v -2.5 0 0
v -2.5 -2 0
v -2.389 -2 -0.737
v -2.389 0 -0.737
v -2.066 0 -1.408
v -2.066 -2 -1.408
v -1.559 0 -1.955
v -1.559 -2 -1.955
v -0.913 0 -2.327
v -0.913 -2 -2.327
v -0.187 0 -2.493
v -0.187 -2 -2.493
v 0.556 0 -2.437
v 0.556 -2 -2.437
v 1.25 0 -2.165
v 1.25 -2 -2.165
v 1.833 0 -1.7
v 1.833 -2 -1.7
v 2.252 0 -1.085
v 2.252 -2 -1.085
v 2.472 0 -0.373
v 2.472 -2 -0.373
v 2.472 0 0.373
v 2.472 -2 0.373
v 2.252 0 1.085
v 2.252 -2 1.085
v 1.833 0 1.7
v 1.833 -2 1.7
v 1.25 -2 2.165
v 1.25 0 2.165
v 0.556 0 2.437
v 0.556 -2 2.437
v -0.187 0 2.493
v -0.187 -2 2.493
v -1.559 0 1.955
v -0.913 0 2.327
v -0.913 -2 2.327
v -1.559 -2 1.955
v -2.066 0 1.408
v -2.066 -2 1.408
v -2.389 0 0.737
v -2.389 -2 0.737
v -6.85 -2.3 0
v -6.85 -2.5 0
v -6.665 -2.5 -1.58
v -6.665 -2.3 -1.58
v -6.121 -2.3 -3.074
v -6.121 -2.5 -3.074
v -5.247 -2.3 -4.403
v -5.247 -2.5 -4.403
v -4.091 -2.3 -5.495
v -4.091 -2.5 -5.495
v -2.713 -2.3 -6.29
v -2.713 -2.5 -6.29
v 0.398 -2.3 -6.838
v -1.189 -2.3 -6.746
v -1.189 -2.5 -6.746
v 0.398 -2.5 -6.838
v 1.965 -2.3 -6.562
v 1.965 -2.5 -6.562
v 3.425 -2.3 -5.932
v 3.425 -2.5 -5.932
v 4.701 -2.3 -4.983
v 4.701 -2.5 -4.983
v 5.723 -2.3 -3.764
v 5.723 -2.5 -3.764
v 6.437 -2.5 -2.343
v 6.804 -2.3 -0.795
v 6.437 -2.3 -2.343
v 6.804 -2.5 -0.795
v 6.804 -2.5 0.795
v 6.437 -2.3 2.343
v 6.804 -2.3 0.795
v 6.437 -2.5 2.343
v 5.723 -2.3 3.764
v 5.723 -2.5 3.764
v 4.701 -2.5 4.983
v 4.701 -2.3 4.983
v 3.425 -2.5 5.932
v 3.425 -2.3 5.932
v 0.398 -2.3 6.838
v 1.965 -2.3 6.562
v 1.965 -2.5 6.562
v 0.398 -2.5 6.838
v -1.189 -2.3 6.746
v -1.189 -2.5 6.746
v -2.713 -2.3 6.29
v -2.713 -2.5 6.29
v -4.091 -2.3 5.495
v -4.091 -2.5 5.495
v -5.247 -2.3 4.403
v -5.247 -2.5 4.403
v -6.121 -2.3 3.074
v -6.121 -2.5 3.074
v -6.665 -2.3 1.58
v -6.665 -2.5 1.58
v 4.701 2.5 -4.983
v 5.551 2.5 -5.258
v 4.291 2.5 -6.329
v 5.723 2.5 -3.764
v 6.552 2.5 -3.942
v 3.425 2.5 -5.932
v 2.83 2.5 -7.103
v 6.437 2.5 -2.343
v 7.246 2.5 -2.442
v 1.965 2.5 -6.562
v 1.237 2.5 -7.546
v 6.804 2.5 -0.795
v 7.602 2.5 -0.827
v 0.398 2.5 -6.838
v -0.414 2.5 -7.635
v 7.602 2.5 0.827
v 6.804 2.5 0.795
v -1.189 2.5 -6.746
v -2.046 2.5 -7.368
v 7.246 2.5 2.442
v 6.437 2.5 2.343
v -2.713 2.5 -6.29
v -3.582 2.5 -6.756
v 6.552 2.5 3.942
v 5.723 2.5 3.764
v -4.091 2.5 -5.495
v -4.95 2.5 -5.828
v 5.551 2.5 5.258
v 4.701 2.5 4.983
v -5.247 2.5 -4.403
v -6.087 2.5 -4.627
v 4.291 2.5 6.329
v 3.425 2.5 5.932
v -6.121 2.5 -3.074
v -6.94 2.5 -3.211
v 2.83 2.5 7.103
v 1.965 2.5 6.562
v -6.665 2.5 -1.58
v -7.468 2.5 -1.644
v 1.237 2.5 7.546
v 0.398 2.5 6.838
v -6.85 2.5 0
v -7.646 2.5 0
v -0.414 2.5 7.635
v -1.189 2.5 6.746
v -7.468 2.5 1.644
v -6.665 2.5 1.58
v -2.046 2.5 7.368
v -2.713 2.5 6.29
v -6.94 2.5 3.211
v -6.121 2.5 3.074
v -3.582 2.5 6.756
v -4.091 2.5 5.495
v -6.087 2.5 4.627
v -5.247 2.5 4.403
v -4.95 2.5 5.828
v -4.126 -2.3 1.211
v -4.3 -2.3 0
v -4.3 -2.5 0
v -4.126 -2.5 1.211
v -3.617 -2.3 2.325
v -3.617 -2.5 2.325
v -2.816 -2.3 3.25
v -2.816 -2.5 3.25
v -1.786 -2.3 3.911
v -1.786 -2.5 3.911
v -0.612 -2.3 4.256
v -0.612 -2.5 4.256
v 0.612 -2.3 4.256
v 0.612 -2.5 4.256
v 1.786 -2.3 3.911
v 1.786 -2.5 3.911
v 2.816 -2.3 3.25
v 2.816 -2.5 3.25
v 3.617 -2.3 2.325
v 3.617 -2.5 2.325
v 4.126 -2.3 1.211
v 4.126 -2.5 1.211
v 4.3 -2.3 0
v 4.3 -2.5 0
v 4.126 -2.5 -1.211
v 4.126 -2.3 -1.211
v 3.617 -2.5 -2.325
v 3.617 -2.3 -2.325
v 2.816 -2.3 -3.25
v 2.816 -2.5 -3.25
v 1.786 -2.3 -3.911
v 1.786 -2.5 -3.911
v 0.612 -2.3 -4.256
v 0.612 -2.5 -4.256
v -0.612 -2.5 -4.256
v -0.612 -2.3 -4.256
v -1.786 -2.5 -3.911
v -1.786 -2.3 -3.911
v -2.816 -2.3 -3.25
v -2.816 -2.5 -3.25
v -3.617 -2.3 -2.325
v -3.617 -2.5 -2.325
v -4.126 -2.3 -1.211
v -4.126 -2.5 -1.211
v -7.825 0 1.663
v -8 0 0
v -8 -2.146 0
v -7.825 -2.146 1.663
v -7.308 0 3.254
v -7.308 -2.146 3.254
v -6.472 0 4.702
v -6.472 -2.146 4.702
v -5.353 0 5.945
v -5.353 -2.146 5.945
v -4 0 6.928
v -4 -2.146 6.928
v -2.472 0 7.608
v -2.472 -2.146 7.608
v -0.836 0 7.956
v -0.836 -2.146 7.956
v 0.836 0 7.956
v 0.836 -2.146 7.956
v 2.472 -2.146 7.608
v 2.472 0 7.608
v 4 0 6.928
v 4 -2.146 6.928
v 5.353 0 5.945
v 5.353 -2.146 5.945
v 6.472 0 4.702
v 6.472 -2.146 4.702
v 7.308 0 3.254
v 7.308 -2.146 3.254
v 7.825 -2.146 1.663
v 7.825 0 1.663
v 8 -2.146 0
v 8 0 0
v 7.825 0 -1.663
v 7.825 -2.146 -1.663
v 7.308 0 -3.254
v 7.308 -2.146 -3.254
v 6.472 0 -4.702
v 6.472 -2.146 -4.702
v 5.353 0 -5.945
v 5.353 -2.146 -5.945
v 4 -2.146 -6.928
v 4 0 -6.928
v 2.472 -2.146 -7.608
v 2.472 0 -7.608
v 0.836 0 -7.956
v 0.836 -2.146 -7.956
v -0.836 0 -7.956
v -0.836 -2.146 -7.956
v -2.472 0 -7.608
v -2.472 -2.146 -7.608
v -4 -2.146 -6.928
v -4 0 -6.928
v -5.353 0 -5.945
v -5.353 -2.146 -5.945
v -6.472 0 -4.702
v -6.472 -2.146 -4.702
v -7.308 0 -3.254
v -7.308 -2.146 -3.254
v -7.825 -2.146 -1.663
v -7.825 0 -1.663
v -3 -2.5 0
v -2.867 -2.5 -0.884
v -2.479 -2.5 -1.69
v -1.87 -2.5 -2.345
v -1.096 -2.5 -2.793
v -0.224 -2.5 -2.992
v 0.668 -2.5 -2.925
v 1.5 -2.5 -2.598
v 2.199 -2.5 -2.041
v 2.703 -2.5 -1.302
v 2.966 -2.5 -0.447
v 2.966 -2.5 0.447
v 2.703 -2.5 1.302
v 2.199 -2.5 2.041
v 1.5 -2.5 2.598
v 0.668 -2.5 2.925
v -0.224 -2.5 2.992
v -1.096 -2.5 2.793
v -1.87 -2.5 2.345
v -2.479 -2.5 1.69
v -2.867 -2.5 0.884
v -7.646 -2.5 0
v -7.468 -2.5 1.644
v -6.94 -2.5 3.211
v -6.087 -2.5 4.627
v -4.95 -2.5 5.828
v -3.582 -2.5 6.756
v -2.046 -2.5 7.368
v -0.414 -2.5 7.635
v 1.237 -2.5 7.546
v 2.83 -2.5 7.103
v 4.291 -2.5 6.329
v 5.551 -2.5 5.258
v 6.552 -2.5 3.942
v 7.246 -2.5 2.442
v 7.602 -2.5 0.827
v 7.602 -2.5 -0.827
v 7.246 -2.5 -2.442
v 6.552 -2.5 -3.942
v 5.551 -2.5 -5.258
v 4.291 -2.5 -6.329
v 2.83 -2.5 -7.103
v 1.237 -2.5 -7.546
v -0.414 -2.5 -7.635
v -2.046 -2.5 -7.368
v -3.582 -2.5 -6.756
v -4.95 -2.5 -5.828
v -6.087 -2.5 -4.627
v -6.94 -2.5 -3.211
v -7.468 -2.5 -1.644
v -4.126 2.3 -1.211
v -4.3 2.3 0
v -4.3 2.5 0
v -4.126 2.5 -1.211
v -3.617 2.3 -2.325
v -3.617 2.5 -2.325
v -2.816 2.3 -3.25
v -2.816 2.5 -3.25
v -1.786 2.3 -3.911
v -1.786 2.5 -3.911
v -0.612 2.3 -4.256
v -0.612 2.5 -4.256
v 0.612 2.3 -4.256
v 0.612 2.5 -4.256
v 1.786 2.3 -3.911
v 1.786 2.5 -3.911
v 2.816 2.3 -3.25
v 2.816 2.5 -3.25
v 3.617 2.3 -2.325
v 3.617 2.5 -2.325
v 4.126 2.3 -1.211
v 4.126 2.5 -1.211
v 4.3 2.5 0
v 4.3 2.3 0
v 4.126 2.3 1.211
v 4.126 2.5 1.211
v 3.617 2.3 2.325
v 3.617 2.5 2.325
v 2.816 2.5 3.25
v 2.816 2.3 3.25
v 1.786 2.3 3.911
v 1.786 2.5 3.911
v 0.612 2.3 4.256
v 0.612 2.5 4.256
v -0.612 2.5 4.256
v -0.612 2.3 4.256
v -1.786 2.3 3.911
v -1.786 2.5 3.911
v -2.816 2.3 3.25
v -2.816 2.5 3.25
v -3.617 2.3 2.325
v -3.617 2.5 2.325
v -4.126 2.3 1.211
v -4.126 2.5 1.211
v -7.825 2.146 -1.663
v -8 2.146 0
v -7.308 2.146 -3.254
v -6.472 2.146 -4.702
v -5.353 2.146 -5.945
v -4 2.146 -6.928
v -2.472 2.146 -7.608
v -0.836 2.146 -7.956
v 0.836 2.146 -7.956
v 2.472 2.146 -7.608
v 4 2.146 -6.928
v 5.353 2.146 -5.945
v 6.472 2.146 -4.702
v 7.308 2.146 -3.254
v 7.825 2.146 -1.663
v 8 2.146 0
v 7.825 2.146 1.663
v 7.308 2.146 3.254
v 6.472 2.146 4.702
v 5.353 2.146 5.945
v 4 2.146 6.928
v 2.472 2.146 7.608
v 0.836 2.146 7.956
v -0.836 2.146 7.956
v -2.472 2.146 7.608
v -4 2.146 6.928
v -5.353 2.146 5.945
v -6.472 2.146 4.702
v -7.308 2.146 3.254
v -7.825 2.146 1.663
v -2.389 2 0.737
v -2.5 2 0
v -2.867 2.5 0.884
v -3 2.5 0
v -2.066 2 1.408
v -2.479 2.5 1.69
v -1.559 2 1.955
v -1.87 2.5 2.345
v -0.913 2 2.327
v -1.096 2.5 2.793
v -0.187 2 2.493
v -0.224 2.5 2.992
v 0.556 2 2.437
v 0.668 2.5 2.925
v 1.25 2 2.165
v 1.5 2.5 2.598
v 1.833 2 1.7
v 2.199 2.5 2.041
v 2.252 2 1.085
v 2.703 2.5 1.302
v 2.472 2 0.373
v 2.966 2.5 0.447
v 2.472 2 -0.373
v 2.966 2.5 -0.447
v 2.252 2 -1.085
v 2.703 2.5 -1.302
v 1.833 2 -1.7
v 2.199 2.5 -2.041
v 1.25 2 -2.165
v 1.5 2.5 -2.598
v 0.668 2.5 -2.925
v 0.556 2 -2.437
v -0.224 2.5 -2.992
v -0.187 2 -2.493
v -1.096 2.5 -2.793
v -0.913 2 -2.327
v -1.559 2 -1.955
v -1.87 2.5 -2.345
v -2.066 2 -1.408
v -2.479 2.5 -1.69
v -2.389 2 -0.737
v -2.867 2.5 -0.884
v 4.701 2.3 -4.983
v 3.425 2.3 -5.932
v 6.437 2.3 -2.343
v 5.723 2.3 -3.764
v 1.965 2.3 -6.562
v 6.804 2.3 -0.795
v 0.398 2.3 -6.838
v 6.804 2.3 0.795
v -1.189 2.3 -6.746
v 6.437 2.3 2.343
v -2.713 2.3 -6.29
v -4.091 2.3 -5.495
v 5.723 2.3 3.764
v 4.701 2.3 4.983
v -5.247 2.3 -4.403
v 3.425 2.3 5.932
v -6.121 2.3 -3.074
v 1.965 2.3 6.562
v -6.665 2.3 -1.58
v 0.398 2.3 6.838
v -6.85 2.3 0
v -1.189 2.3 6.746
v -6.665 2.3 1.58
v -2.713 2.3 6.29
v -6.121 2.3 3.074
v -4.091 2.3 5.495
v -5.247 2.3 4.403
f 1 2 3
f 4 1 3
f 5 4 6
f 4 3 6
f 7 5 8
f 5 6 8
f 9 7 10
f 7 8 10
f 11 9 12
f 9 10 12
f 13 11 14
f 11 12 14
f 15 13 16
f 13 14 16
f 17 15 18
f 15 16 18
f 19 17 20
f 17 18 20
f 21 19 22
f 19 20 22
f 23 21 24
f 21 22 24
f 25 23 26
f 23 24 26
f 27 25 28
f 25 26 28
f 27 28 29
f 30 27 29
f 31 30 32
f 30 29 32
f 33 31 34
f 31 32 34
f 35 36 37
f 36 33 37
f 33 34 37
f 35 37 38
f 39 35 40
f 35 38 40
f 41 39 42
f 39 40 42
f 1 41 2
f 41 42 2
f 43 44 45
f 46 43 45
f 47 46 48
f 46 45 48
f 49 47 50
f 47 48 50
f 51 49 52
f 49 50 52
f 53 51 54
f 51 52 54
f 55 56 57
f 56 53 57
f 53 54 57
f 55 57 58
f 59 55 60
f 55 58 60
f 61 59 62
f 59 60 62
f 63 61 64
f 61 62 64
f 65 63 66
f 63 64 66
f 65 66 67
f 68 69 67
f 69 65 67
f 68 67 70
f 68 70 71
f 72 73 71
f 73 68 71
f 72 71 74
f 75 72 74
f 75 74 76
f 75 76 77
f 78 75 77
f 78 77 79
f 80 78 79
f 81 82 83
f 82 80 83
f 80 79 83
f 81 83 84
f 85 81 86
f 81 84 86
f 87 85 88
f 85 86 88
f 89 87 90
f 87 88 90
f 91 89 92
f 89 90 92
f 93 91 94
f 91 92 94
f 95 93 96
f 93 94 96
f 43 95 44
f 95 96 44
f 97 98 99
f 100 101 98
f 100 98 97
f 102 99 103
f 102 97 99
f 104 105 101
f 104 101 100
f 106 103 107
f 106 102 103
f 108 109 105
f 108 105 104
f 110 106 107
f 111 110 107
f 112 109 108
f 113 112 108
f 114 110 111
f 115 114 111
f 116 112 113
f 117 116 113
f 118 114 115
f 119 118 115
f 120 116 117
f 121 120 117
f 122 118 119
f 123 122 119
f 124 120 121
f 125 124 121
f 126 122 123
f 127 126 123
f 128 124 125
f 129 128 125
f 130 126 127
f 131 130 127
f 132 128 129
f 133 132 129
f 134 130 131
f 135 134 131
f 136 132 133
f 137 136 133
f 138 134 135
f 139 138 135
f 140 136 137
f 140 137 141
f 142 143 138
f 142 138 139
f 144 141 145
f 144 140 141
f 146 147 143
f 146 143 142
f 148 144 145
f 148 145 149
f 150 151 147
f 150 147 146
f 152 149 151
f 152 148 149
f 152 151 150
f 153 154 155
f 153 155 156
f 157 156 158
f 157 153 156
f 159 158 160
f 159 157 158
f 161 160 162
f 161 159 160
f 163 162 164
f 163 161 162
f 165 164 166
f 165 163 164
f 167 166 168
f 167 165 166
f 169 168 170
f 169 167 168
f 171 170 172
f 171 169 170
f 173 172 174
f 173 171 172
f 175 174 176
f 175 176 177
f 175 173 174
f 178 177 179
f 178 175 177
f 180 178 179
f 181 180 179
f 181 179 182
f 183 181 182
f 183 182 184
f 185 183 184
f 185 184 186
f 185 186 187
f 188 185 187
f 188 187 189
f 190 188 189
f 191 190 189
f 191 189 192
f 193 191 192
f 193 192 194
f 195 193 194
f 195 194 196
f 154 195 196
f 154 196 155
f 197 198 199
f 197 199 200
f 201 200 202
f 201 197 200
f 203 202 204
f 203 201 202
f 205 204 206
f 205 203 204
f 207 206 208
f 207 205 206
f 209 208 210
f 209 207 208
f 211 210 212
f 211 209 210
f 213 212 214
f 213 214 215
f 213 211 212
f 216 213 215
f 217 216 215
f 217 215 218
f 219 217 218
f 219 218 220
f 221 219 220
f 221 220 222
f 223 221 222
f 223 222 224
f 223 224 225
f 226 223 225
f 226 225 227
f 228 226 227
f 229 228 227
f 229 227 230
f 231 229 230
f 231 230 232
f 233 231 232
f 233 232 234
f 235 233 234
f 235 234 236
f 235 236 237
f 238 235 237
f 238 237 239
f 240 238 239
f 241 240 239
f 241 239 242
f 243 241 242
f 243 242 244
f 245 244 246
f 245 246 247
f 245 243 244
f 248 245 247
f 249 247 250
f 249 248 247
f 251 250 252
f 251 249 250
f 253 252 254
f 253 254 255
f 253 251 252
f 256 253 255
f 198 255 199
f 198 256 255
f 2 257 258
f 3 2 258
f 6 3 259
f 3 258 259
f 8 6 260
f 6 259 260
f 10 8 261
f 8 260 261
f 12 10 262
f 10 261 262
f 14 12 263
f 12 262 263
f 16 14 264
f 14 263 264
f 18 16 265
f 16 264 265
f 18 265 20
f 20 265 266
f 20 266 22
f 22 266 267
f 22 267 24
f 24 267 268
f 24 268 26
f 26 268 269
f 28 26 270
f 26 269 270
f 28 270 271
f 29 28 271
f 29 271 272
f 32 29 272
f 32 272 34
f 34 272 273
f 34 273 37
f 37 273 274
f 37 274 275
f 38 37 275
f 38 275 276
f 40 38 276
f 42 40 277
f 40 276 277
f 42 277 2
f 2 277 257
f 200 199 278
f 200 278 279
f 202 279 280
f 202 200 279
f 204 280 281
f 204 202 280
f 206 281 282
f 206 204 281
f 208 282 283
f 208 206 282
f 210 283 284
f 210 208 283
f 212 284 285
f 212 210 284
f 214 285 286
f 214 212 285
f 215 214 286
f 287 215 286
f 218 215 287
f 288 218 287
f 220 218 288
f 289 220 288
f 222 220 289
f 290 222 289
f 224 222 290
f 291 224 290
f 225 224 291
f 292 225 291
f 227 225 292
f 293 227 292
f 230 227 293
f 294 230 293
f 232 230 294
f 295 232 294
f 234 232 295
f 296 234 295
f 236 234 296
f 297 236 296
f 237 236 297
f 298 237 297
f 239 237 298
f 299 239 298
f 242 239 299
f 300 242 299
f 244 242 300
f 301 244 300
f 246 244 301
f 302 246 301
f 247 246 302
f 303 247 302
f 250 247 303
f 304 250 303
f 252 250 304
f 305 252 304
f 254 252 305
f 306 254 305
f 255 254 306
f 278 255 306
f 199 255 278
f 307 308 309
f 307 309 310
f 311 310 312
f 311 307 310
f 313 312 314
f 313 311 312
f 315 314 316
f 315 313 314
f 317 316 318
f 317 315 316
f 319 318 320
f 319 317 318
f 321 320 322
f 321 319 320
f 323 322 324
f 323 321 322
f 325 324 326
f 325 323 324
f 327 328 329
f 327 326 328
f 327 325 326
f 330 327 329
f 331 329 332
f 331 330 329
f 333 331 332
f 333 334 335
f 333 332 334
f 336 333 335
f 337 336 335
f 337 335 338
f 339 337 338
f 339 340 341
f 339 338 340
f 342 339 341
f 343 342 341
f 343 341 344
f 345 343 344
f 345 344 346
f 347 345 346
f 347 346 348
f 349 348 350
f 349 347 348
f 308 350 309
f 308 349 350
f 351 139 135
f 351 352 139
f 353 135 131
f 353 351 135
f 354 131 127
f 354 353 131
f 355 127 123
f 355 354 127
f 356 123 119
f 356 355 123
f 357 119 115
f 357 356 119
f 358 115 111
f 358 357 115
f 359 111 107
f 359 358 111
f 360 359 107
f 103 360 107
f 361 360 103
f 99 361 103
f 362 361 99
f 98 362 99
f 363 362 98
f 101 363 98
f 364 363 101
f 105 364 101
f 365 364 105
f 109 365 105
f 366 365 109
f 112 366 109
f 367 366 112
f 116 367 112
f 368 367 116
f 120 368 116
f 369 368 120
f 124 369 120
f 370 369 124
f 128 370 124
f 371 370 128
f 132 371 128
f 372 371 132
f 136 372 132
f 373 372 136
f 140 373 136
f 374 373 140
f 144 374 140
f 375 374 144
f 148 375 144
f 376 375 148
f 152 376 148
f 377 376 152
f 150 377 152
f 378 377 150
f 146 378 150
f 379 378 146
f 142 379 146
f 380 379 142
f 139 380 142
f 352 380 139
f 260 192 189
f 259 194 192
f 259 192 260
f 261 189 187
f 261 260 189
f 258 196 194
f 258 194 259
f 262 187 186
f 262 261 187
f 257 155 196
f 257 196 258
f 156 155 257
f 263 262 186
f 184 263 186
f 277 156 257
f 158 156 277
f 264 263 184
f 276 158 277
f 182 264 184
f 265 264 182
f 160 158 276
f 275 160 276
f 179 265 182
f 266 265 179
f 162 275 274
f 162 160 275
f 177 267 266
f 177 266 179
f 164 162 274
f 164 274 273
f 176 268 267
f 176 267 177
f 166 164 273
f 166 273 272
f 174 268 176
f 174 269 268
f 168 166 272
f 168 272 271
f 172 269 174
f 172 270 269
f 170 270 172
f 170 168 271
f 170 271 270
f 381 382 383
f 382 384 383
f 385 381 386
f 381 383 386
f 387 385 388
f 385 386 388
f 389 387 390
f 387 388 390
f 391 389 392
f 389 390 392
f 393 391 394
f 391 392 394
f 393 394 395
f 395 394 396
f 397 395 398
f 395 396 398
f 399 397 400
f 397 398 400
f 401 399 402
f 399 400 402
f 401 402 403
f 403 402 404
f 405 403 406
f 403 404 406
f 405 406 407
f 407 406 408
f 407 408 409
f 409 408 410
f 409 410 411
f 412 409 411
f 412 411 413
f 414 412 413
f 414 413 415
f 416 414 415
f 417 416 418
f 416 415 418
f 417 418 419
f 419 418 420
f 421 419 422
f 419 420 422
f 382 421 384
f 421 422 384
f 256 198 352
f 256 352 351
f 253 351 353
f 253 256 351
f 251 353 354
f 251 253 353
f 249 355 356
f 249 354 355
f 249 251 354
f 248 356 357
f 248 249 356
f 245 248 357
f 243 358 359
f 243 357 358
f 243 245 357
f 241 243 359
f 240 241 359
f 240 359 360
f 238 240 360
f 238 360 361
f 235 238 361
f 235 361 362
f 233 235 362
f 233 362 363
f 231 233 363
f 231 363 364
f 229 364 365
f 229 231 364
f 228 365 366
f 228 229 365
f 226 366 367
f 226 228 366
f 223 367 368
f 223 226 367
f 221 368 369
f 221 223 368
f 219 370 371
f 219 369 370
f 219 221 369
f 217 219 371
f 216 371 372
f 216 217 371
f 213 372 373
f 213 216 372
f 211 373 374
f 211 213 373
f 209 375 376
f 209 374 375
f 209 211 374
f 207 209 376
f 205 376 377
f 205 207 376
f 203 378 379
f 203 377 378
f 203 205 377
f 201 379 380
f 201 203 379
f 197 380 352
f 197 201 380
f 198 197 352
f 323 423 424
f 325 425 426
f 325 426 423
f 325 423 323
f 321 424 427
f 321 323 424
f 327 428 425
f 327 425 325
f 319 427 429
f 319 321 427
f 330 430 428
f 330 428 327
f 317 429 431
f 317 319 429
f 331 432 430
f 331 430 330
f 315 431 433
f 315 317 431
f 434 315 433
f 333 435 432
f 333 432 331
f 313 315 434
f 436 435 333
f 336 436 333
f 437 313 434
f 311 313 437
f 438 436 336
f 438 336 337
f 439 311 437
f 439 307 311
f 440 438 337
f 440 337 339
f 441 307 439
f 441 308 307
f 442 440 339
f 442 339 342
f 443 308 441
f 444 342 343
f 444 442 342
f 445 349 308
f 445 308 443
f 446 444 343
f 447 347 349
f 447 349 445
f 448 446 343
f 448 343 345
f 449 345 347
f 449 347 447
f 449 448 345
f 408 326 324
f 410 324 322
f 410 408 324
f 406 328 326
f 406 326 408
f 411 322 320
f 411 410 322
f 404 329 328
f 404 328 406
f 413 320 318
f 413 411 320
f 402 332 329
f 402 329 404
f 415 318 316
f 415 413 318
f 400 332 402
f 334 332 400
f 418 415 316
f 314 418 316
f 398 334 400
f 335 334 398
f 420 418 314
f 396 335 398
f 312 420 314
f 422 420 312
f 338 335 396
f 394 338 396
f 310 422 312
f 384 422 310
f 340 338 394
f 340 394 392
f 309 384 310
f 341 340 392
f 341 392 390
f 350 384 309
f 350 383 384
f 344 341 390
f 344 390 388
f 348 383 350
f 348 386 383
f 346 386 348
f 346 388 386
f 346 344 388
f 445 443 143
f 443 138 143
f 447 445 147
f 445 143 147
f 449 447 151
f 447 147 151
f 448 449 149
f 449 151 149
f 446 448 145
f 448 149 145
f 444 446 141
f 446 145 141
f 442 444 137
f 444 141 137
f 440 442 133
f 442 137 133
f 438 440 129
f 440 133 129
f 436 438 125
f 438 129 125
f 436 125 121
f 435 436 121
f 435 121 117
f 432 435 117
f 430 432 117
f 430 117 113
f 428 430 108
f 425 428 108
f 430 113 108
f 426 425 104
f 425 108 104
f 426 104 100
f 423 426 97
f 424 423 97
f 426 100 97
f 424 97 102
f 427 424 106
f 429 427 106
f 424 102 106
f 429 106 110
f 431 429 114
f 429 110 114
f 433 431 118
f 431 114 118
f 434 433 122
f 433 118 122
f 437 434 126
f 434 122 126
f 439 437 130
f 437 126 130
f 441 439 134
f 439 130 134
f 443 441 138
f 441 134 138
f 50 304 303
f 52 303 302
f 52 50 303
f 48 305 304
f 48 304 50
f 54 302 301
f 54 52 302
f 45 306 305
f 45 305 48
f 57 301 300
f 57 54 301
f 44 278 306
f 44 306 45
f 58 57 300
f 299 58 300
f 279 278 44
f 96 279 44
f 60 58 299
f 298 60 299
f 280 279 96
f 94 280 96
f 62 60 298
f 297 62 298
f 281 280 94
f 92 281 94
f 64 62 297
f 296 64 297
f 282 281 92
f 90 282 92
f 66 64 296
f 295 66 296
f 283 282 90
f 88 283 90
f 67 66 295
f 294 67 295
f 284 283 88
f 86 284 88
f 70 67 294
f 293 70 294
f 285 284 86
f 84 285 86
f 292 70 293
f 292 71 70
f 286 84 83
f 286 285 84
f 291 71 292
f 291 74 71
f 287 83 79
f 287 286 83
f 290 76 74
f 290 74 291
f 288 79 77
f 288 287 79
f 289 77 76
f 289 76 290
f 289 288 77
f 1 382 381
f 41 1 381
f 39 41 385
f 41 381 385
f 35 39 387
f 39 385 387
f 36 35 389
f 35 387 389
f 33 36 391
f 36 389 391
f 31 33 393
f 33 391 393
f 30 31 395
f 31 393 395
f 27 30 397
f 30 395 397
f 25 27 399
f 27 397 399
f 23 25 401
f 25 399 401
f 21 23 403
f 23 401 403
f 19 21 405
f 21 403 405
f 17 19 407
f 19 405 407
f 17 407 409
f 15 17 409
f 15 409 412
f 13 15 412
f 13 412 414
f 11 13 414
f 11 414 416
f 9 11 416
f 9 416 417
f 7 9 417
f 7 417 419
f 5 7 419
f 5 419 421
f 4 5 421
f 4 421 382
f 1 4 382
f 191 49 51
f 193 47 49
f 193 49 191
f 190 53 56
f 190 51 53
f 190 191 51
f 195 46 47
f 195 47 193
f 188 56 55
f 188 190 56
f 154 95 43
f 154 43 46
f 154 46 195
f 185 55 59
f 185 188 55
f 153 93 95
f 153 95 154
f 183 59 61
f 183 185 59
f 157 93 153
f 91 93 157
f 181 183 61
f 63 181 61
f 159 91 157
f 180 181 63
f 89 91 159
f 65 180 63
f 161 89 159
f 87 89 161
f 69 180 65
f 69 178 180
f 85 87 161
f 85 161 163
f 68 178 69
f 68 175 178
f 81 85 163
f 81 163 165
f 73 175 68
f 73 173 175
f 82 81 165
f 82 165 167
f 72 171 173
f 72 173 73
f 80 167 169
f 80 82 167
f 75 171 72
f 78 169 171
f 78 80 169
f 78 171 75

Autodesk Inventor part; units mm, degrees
ref_plane "YZ Plane" through (0, 0, 0) normal (1, 0, 0) x (0, 1, 0)
ref_plane "XZ Plane" through (0, 0, 0) normal (0, 1, 0) x (-1, 0, 0)
ref_plane "XY Plane" through (0, 0, 0) normal (0, 0, 1) x (1, 0, 0)
sketch "Sketch1" plane through (0, 0, 0) normal (0, 0, 1) x (1, 0, 0)
  line L0 (0, 0) -> (0, 2.5)
  line L1 (-2.5, 0) -> (-2.5, 2)
  line L2 (-2.5, 2) -> (-3, 2.5)
  line L3 (-3, 2.5) -> (-4.3, 2.5)
  line L4 (-4.3, 2.5) -> (-4.3, 2.3)
  line L5 (-4.3, 2.3) -> (-6.85, 2.3)
  line L6 (-6.85, 2.3) -> (-6.85, 2.5)
  line L7 (-6.85, 2.5) -> (-7.6465, 2.5)
  line L8 (-7.6465, 2.5) -> (-8, 2.1465)
  line L9 (-8, 2.1465) -> (-8, 0)
  line L10 (-8, 0) -> (-2.5, 0)
  dimension "d9" = 2.5
  dimension "d19" = 2.5
  dimension "d20" = 0.2
  dimension "d21" = 5
  dimension "d22" = 6
  dimension "d23" = 8.6
  dimension "d24" = 13.7
  dimension "d26" = 16
  dimension "d27" = 135
  dimension "d29" = 0.5
  dimension "d30" = 15.293
revolve "Revolution1" add sketch "Sketch1" angle 360 about axis through (0, 0, 0) along (0, 1, 0)
mirror "Mirror1" about plane through (-5.25, 0, 0) normal (0, -1, 0) of "Revolution1"
equation "\"d19\" = d9"
properties part number "625 2RS Bearing"
